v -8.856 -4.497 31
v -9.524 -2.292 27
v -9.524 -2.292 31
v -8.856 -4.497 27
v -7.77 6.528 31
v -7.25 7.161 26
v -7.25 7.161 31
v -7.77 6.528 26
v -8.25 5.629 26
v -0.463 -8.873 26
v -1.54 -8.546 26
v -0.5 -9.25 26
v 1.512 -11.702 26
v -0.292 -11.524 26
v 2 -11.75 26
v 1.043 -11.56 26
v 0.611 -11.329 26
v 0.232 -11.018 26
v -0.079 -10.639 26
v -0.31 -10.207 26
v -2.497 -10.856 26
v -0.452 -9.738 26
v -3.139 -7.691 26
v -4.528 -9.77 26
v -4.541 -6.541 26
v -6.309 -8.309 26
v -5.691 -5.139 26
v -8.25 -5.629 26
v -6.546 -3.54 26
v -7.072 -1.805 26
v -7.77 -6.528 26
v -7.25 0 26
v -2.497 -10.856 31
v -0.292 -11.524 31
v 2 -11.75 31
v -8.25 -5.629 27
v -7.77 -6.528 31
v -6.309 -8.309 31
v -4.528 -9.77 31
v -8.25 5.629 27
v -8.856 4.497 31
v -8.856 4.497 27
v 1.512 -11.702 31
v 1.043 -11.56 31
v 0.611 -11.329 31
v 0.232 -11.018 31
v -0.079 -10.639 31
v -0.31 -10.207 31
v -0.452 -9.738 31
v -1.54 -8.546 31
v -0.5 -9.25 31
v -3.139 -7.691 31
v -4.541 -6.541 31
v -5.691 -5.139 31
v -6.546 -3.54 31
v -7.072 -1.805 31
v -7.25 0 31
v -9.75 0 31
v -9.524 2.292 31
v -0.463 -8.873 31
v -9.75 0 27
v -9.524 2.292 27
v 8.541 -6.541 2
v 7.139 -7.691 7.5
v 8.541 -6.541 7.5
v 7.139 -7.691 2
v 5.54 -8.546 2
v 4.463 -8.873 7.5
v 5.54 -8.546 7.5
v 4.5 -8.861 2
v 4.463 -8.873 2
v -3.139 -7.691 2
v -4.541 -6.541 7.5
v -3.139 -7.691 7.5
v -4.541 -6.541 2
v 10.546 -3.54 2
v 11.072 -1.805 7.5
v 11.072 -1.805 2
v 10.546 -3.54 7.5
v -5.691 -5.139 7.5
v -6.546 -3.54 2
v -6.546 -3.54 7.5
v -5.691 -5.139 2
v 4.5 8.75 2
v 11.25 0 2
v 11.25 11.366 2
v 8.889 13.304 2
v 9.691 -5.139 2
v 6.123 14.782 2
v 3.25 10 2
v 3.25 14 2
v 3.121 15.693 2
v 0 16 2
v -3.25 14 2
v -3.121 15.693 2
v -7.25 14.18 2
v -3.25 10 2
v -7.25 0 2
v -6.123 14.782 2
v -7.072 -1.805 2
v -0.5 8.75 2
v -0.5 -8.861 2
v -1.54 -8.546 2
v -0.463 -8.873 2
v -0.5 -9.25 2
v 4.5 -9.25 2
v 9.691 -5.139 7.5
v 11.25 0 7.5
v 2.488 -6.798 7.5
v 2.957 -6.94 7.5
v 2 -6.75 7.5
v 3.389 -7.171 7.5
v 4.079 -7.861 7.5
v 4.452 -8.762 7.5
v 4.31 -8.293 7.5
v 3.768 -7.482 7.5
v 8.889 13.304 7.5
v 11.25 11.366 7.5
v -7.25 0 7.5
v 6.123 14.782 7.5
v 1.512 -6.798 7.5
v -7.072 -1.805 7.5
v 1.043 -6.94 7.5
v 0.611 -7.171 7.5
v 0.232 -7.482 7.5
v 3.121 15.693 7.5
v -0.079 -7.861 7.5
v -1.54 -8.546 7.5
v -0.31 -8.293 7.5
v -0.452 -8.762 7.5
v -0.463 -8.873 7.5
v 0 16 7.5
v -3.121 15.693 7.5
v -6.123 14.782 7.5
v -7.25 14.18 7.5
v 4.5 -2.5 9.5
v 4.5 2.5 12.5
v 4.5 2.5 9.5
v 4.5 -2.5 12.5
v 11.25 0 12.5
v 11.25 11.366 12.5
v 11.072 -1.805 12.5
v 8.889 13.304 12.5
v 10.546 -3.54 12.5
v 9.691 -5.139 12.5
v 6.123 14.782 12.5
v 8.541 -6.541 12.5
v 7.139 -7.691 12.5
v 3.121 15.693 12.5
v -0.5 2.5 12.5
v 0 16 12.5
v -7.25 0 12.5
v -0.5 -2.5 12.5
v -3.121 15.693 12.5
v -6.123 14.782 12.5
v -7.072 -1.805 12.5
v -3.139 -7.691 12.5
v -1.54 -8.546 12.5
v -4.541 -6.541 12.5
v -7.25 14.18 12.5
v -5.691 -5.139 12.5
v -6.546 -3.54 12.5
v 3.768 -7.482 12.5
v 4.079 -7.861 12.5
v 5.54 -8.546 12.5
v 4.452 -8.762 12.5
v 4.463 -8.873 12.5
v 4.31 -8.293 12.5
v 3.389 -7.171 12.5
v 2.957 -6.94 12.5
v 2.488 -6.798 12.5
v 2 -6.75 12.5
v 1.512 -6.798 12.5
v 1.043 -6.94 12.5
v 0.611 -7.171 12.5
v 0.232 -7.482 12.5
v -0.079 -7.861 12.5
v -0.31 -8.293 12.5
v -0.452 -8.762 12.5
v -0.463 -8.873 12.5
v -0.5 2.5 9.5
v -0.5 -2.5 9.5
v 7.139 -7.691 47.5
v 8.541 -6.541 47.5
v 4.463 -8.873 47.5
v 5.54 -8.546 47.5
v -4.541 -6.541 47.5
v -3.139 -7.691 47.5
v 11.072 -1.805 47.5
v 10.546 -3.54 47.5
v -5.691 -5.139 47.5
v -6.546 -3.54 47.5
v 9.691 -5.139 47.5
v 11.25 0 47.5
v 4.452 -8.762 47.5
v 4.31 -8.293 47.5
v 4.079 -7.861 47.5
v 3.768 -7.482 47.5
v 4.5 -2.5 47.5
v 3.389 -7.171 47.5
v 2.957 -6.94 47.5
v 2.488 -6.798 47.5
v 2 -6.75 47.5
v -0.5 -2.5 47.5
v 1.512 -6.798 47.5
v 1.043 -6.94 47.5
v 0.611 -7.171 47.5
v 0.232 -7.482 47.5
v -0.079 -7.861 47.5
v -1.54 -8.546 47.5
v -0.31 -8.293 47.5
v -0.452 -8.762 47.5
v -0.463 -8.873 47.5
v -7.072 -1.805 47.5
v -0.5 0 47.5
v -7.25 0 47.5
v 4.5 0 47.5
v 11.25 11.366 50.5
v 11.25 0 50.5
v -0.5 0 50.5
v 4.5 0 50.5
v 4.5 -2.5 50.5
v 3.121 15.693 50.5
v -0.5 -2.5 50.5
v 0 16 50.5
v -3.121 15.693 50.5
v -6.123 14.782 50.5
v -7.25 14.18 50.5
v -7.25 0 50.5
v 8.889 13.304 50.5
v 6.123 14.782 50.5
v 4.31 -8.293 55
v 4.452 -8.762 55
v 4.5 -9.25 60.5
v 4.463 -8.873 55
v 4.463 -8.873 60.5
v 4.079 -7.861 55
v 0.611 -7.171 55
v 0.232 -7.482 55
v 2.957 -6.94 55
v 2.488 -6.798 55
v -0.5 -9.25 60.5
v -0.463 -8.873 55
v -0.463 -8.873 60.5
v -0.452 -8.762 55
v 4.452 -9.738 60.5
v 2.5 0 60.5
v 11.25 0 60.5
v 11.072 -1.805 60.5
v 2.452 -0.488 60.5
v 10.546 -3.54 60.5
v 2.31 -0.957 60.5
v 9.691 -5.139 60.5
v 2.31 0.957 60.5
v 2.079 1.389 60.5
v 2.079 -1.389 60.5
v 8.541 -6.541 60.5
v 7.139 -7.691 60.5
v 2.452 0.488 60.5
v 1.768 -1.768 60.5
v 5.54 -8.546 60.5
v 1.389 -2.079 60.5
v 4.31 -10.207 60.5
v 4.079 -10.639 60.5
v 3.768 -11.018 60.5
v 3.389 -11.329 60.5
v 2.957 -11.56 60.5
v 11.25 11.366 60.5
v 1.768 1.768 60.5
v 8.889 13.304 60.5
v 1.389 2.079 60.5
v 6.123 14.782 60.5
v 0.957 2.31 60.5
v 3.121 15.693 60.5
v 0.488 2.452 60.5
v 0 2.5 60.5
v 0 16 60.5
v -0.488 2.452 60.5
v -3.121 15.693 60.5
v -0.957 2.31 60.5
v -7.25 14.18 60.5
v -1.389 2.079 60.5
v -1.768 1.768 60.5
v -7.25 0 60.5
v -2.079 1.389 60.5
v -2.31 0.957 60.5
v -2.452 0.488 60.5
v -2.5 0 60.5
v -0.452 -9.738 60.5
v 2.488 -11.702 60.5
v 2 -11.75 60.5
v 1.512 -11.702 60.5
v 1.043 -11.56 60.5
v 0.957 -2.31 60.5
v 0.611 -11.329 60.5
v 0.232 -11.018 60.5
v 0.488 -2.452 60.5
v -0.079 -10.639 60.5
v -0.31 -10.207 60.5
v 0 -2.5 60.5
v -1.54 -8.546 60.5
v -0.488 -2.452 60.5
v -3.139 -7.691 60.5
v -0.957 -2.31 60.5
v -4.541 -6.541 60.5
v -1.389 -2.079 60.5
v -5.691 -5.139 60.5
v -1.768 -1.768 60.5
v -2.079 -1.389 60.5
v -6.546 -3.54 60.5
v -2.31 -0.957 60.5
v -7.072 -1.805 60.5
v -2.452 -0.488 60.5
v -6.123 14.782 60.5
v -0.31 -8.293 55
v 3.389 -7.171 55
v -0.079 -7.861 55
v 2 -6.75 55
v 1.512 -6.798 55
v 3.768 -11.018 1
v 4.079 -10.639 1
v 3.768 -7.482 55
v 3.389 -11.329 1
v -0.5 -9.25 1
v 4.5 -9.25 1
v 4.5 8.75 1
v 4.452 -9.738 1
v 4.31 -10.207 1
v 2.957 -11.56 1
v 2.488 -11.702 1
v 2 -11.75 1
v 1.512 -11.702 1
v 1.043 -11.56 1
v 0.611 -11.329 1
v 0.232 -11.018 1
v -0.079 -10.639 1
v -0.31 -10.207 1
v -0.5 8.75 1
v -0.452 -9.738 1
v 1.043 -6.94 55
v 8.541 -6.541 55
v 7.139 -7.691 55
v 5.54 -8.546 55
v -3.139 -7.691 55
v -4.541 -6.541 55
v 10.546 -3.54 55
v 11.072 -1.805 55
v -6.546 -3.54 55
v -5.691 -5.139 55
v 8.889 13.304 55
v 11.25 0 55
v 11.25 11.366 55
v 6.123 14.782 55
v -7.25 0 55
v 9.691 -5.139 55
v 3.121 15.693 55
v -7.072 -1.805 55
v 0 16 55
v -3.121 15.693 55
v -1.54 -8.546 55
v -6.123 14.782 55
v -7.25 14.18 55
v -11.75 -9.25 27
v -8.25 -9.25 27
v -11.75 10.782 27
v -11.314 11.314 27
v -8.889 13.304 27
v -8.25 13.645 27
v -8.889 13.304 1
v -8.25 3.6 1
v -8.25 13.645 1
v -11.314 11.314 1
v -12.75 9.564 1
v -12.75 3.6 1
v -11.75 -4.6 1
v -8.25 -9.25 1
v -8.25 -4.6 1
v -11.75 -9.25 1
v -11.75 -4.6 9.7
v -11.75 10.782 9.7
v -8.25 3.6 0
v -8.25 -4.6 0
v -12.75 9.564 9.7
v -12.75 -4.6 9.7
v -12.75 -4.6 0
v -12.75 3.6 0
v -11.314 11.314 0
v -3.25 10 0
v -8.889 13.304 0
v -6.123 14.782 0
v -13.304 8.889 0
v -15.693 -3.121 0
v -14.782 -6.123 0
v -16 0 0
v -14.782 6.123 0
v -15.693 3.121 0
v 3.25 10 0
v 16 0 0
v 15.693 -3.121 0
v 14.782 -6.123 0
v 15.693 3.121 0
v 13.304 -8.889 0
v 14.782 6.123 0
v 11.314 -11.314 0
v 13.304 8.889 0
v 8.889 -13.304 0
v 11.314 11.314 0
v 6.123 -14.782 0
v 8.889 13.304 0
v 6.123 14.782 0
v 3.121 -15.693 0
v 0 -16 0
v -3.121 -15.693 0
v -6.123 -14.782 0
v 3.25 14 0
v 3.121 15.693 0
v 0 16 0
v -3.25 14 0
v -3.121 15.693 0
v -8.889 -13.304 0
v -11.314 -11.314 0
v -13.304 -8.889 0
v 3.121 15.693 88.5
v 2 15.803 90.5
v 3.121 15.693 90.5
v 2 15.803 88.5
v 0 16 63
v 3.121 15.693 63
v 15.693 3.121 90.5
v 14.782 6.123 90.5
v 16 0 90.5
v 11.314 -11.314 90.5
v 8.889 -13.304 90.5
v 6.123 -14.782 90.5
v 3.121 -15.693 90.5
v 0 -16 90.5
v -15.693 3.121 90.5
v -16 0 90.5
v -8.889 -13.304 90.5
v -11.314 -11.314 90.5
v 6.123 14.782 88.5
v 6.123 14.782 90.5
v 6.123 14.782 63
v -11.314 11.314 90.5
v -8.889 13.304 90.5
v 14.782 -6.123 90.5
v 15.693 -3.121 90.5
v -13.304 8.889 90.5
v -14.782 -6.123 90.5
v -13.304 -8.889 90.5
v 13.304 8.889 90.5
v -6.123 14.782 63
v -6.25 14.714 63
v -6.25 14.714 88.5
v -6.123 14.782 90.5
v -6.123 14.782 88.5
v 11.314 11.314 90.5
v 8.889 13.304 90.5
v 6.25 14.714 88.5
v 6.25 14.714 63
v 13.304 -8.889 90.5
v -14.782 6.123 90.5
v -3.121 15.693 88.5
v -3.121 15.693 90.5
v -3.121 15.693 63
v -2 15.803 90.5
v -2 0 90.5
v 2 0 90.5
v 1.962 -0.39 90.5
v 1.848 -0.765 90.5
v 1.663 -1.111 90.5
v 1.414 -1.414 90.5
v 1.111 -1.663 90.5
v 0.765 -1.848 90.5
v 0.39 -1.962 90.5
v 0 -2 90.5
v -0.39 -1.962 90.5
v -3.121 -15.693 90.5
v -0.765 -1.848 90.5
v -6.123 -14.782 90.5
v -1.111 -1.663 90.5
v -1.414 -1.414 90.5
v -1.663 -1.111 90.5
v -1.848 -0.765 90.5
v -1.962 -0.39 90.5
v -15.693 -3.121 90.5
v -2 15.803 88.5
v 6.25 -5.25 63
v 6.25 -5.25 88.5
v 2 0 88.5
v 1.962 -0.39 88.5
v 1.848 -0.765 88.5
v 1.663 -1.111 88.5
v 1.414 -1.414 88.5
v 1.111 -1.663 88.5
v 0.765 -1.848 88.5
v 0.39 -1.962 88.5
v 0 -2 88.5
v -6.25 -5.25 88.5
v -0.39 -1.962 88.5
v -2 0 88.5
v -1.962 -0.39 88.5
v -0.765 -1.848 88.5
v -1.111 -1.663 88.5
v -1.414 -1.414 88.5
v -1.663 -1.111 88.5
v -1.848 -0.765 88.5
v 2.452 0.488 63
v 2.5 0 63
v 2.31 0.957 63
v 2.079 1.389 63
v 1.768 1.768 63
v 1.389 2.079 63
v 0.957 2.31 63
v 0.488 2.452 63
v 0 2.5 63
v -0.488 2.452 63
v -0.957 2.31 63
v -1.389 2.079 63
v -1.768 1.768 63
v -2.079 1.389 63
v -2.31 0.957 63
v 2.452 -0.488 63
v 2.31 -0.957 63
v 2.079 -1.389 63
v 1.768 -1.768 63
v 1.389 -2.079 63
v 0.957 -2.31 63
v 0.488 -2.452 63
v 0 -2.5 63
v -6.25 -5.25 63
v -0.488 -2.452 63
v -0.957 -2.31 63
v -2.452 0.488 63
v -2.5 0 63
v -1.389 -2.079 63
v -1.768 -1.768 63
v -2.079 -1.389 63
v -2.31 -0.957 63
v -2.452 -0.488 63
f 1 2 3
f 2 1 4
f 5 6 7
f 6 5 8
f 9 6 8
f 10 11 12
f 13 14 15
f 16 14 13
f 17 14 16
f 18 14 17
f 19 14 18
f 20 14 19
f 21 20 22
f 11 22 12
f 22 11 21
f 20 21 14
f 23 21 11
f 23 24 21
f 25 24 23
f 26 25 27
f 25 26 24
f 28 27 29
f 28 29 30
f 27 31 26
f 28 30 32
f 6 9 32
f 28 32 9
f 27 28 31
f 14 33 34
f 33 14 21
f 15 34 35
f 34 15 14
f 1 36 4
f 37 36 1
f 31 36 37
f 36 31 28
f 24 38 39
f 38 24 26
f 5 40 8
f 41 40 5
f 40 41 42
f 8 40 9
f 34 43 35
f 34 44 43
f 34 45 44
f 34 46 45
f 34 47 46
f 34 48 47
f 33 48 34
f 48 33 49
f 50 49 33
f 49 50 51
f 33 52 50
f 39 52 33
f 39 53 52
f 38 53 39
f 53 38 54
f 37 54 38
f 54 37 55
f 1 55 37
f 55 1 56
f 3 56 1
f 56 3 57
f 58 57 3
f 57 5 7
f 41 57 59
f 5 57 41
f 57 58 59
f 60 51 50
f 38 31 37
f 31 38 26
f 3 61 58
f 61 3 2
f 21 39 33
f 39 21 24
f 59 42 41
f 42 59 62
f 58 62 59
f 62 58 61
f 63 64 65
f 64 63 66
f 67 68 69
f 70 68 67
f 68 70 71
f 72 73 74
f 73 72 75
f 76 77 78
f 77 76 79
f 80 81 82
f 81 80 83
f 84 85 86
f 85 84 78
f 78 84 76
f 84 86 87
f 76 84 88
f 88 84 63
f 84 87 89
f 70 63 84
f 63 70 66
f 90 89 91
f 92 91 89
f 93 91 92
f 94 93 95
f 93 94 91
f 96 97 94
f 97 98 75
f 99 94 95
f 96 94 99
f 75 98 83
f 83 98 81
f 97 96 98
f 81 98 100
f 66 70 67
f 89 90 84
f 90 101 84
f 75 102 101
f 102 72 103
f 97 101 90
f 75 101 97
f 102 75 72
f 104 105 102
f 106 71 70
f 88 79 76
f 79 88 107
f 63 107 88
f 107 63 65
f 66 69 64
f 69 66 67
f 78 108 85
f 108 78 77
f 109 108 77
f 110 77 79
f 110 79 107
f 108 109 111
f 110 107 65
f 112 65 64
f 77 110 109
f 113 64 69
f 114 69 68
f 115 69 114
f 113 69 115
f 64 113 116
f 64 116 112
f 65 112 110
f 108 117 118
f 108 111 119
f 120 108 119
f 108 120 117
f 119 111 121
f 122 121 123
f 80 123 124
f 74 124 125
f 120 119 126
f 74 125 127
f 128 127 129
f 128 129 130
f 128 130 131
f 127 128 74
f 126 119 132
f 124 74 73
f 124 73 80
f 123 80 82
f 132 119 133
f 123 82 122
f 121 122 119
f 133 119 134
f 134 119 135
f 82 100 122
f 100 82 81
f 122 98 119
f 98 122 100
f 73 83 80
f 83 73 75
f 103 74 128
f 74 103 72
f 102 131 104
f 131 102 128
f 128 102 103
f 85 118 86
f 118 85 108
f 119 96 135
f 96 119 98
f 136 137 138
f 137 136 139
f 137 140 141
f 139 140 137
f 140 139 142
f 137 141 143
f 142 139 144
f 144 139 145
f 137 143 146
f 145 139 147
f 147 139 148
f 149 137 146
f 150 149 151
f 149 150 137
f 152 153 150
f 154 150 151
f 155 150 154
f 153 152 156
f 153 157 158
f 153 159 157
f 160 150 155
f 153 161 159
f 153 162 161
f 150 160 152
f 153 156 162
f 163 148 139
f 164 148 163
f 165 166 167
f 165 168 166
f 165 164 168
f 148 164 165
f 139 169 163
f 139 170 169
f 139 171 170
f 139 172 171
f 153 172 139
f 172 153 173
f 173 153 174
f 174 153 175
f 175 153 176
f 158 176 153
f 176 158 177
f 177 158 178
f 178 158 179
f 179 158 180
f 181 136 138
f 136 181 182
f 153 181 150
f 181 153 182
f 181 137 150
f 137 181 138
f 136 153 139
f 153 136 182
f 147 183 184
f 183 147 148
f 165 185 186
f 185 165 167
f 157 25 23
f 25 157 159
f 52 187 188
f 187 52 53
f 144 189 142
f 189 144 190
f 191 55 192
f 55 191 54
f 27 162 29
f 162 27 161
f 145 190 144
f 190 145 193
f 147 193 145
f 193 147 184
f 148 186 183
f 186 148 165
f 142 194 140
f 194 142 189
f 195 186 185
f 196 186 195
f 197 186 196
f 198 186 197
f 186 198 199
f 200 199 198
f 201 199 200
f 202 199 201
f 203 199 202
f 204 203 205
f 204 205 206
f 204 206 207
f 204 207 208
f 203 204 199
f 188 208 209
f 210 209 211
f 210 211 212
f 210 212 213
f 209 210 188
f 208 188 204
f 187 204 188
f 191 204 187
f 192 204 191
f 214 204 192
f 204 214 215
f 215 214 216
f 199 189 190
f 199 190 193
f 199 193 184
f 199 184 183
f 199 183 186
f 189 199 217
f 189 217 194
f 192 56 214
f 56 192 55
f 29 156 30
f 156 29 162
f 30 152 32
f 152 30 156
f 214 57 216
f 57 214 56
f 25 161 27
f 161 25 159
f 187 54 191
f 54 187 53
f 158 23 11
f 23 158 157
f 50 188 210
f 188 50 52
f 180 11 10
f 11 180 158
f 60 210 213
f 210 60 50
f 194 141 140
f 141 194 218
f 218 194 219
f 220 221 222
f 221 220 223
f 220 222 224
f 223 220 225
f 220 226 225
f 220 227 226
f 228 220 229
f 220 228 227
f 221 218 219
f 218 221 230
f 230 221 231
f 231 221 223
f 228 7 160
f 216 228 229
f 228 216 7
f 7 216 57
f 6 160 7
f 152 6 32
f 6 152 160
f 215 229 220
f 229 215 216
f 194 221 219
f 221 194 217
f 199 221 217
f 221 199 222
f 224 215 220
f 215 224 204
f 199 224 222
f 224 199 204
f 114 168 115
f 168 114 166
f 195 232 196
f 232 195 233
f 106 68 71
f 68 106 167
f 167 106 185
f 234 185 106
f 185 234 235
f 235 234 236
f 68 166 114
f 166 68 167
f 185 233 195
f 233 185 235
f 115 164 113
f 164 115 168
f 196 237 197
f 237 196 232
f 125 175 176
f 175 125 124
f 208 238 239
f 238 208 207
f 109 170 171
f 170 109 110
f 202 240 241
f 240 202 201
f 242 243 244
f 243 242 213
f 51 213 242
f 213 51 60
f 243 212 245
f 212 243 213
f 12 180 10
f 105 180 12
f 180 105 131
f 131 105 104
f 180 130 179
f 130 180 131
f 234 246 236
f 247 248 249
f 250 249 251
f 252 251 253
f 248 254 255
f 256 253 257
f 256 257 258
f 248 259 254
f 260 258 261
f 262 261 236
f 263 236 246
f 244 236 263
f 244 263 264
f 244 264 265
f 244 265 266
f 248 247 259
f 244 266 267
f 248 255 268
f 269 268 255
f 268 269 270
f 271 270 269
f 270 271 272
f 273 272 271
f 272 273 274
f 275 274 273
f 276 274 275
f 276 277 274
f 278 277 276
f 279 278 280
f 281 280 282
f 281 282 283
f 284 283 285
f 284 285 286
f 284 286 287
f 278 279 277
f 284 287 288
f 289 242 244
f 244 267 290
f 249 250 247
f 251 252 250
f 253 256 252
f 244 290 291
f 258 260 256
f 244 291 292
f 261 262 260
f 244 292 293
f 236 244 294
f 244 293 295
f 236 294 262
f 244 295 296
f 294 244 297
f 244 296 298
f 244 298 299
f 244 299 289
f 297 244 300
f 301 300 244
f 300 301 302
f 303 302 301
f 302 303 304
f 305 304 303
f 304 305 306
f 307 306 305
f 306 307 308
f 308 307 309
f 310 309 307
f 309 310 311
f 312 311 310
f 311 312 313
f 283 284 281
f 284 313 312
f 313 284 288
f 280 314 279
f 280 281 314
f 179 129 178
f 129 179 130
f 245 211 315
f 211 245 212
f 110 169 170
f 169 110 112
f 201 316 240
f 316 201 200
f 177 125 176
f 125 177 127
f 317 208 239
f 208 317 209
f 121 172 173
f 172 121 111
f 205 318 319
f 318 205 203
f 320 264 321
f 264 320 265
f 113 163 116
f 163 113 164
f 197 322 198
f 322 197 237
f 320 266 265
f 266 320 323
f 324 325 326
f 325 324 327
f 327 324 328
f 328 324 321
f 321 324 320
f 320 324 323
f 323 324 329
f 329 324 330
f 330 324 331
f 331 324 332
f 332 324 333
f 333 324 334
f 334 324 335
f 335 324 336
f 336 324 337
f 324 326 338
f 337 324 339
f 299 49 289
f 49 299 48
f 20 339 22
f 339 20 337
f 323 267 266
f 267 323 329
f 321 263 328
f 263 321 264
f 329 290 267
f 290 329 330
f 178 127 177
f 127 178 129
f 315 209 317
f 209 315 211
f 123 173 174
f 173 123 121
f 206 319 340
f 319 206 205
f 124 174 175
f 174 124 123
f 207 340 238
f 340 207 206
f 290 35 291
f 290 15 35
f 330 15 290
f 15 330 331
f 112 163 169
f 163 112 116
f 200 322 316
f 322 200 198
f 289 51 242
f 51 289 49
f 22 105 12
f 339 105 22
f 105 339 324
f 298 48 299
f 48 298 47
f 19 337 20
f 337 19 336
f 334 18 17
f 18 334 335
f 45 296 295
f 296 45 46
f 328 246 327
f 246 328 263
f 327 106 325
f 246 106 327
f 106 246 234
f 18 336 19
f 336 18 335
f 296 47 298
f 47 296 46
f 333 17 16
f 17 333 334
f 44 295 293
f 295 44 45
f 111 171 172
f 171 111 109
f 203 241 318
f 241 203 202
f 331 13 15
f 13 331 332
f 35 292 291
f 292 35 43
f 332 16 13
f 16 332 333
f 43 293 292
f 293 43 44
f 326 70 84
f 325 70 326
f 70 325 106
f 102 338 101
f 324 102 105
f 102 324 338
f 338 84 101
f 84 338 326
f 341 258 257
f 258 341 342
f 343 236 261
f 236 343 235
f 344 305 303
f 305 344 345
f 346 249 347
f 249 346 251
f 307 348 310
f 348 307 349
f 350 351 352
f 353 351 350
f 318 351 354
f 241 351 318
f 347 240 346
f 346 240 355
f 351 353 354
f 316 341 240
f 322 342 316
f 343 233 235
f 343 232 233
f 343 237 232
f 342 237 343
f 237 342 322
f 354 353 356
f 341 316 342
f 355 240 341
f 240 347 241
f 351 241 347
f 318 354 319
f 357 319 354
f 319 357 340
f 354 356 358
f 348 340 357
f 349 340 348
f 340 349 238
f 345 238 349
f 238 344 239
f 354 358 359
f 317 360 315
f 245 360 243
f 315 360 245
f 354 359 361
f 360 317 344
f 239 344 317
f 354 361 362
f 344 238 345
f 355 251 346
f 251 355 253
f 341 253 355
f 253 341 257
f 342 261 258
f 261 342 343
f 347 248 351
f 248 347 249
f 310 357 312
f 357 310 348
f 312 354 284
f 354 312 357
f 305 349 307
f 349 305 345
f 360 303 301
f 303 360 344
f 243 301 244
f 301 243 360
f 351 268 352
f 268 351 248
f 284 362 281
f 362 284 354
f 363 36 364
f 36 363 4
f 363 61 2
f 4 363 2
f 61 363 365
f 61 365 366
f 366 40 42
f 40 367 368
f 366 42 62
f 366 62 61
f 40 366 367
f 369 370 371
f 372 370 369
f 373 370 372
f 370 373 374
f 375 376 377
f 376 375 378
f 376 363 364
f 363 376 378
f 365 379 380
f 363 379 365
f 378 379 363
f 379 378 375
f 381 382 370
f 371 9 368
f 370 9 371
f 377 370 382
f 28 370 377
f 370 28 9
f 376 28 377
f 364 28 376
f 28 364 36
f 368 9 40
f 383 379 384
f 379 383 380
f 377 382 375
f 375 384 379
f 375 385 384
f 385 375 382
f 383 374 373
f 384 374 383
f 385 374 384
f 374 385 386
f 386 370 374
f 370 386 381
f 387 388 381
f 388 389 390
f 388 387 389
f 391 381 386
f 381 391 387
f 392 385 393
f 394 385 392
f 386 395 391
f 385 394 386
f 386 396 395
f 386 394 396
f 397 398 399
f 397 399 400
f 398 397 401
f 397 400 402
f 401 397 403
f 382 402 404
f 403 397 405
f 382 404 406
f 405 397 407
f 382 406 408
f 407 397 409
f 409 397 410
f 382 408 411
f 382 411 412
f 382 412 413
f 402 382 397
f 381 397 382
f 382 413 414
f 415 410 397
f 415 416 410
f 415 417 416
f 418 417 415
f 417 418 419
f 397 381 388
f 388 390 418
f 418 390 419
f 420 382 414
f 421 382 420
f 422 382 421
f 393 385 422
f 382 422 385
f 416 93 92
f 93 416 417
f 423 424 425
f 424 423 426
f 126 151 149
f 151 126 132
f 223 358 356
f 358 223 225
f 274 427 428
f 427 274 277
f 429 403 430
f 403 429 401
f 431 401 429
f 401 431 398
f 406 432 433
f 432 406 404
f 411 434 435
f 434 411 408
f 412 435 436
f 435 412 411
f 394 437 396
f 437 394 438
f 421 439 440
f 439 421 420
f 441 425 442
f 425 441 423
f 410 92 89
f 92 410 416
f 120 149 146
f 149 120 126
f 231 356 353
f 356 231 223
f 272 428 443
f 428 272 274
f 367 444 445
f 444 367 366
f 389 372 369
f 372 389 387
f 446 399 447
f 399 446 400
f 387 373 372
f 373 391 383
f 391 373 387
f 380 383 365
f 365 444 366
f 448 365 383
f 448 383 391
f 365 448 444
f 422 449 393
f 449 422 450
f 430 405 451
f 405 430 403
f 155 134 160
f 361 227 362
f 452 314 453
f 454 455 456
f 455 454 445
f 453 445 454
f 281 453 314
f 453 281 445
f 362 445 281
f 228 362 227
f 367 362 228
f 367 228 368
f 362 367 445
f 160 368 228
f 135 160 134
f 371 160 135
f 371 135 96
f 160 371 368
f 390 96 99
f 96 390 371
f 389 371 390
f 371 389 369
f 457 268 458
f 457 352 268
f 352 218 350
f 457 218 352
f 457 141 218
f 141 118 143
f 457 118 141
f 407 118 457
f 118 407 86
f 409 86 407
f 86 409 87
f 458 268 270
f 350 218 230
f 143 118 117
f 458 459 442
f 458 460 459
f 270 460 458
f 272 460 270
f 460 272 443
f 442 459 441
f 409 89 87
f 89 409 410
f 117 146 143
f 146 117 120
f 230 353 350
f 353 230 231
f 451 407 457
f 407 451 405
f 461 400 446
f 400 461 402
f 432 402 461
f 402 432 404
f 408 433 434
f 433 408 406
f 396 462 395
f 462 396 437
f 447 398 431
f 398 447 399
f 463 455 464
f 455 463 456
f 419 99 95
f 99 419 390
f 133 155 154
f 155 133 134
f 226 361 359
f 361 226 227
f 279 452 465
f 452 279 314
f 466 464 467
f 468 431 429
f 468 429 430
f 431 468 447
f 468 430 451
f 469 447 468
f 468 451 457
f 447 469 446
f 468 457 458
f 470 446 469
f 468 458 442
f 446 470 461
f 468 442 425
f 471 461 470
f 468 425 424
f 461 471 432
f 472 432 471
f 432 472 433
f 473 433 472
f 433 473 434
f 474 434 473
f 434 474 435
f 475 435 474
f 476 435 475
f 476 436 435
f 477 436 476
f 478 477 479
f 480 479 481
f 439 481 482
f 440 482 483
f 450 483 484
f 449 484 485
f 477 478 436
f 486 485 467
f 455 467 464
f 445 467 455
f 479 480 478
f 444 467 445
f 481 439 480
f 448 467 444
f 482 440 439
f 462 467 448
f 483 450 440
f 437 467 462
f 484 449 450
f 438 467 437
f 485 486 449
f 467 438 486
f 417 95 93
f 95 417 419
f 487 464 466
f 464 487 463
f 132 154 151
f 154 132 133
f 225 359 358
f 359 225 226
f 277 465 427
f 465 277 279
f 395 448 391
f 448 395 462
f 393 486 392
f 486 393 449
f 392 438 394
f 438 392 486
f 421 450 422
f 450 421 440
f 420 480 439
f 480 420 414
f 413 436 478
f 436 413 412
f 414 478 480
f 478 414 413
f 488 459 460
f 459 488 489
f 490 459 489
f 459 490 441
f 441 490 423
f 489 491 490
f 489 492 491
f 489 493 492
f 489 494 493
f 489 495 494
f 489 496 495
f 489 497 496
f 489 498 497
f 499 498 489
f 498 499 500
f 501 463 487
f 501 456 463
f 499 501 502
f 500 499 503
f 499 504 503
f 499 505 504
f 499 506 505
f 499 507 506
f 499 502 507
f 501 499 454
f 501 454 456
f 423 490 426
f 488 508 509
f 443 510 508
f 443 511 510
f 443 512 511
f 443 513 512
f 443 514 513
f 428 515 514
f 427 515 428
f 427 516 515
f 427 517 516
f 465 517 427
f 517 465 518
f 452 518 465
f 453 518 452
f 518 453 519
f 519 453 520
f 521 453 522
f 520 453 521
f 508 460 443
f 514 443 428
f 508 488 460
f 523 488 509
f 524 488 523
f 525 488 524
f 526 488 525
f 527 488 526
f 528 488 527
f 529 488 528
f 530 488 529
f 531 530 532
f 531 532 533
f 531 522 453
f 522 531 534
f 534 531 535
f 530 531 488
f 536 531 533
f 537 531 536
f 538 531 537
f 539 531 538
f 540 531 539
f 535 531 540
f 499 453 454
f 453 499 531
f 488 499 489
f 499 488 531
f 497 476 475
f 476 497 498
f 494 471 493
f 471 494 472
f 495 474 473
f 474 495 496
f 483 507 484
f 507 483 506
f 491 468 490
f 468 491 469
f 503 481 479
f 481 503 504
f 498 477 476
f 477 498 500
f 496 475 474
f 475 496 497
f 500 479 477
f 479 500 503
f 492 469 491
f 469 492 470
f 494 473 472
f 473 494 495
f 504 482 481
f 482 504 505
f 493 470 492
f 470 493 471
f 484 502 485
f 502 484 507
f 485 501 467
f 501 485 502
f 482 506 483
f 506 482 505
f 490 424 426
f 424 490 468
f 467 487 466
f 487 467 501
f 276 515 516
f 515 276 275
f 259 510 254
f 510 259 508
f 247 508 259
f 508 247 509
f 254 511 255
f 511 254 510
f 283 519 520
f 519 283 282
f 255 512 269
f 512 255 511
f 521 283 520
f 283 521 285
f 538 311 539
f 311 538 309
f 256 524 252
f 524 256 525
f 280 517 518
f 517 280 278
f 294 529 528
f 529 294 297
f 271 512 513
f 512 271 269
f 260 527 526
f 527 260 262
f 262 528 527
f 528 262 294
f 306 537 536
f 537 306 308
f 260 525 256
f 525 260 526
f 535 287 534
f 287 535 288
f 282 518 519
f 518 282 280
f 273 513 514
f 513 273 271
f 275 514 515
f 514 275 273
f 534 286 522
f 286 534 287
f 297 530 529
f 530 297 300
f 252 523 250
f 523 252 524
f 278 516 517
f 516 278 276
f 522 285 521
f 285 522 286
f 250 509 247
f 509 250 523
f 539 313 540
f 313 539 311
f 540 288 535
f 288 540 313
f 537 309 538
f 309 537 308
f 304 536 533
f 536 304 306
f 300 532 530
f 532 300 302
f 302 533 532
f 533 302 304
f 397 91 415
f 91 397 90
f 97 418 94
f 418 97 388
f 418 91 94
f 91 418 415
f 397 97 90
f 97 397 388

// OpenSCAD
$fn = 32;

height = 90.5;
outer_d = 32;

magnet_h = 5.5;
magnet_d = 18.5;

battery_h = 35;
battery_d = 18.5;

splitter_disc_h = 2;

battery_contact_spacer = 3;
battery_contact_w = 5;
battery_contact_h = 5;
battery_contact_d = 5;

motor_dim = [12.5, 10.5, 25.5];
motor_shaft_d = 4;

charger_dim = [17.5, 3.5, 26];
charger_conn_dim = [8.2, 4.5, 8.7];

button_dims = [6.5, 4, 3.5];

wire_duct_d = 5;

difference() {
    // body
    //cylinder(h=60, d=outer_d);
    cylinder(h=height, d=outer_d);
    
    translate([2, 0, 0]) union() {
        // magnet
        translate([0, 0, splitter_disc_h]) cylinder(h=magnet_h, d=magnet_d);
        // magnet top cut-out
        translate([-magnet_d / 2, 0, splitter_disc_h]) cube([magnet_d, outer_d / 2, magnet_h]);
        
        // battery contact bottom 
        translate([-battery_contact_w / 2, -battery_contact_h / 2, splitter_disc_h + magnet_h + splitter_disc_h]) cube([battery_contact_w, battery_contact_h, battery_contact_spacer]);
        // battery
        translate([0, 0, splitter_disc_h + magnet_h + splitter_disc_h + battery_contact_spacer]) cylinder(h=battery_h, d=battery_d);
        // battery top cut-out
        translate([-battery_d / 2, 0, splitter_disc_h + magnet_h + splitter_disc_h + battery_contact_spacer]) cube([battery_d, outer_d / 2, battery_h + battery_contact_spacer]);
        // battery contact top
        translate([-battery_contact_w / 2, -battery_contact_h / 2, splitter_disc_h + magnet_h + splitter_disc_h + battery_contact_spacer + battery_h]) cube([battery_contact_w, battery_contact_h, battery_contact_spacer]);
        
        // wire duct
        translate([0, -battery_d / 2 , splitter_disc_h / 2]) cylinder(h=splitter_disc_h + magnet_h + splitter_disc_h + battery_contact_spacer + battery_h + battery_contact_spacer + splitter_disc_h + magnet_h + splitter_disc_h - 0.5, d=wire_duct_d);
        translate([-wire_duct_d / 2, -battery_d / 2, splitter_disc_h / 2]) cube([wire_duct_d, outer_d / 2 + 2, splitter_disc_h / 2]);
        translate([0, 0, charger_dim.z]) difference() {
            cylinder(h=wire_duct_d, d=battery_d + wire_duct_d);
            translate([0, -(battery_d + wire_duct_d)/2 , 0]) cube([battery_d + wire_duct_d, battery_d + wire_duct_d, wire_duct_d]);
        }
        
        // fet
        translate([0, 0, splitter_disc_h + magnet_h + splitter_disc_h + battery_contact_spacer + battery_h + splitter_disc_h + magnet_h]) cylinder(h=magnet_h, d=magnet_d);
        // fet top cut-out
        translate([-magnet_d / 2, 0, splitter_disc_h + magnet_h + splitter_disc_h + battery_contact_spacer + battery_h + splitter_disc_h + magnet_h]) cube([magnet_d, outer_d / 2, magnet_h]);
    }
    
    // motor
    translate([-motor_dim.x / 2, -motor_dim.y / 2, height - splitter_disc_h - motor_dim.z]) cube([motor_dim.x, motor_dim.y, motor_dim.z]);
    // motor top cut-out
    translate([-motor_dim.x / 2, 0, height - splitter_disc_h - motor_dim.z]) cube([motor_dim.x, outer_d / 2, motor_dim.z]);
    
    // motor shaft cut-out
    translate([0, 0, height - splitter_disc_h]) cylinder(h=splitter_disc_h, d=motor_shaft_d);
    translate([-motor_shaft_d / 2, 0, height - splitter_disc_h]) cube([motor_shaft_d, outer_d / 2, splitter_disc_h]);
    
    // motor - fet wire duct
    translate([0, 0, height - splitter_disc_h - motor_dim.z -wire_duct_d]) cylinder(h=wire_duct_d, d=wire_duct_d);
    
    // charger
    translate([-battery_d / 2 + 1, -battery_d / 2, splitter_disc_h / 2]) rotate([0, 0, 90]) union() {
        cube([charger_dim.x * 2.5, charger_dim.y, charger_dim.z]);
        translate([charger_dim.x / 2 - charger_conn_dim.x / 2, 0, 0]) cube([charger_conn_dim.x * 2.5, charger_conn_dim.y, charger_conn_dim.z]);
        // bottom cut-out
        translate([charger_dim.x / 2 - charger_conn_dim.x / 2, 0, -1]) cube([charger_conn_dim.x, charger_conn_dim.y, charger_conn_dim.z]);
        // wire duct
        //translate([20, 0, charger_dim.z]) cylinder(h=wire_duct_d, d=battery_d);
        //translate([0, 1, charger_dim.z]) cube([charger_dim.x * 2.5, charger_dim.y - 1, 3]);
        //translate([charger_dim.x - 3, -2, charger_dim.z + 2]) cube([5, 5, 3]);
    }
    
    //button
    translate([-button_dims.x / 2, outer_d / 2 - button_dims.y - 2, 0]) cube([button_dims.x, button_dims.y, button_dims.z]);
}
